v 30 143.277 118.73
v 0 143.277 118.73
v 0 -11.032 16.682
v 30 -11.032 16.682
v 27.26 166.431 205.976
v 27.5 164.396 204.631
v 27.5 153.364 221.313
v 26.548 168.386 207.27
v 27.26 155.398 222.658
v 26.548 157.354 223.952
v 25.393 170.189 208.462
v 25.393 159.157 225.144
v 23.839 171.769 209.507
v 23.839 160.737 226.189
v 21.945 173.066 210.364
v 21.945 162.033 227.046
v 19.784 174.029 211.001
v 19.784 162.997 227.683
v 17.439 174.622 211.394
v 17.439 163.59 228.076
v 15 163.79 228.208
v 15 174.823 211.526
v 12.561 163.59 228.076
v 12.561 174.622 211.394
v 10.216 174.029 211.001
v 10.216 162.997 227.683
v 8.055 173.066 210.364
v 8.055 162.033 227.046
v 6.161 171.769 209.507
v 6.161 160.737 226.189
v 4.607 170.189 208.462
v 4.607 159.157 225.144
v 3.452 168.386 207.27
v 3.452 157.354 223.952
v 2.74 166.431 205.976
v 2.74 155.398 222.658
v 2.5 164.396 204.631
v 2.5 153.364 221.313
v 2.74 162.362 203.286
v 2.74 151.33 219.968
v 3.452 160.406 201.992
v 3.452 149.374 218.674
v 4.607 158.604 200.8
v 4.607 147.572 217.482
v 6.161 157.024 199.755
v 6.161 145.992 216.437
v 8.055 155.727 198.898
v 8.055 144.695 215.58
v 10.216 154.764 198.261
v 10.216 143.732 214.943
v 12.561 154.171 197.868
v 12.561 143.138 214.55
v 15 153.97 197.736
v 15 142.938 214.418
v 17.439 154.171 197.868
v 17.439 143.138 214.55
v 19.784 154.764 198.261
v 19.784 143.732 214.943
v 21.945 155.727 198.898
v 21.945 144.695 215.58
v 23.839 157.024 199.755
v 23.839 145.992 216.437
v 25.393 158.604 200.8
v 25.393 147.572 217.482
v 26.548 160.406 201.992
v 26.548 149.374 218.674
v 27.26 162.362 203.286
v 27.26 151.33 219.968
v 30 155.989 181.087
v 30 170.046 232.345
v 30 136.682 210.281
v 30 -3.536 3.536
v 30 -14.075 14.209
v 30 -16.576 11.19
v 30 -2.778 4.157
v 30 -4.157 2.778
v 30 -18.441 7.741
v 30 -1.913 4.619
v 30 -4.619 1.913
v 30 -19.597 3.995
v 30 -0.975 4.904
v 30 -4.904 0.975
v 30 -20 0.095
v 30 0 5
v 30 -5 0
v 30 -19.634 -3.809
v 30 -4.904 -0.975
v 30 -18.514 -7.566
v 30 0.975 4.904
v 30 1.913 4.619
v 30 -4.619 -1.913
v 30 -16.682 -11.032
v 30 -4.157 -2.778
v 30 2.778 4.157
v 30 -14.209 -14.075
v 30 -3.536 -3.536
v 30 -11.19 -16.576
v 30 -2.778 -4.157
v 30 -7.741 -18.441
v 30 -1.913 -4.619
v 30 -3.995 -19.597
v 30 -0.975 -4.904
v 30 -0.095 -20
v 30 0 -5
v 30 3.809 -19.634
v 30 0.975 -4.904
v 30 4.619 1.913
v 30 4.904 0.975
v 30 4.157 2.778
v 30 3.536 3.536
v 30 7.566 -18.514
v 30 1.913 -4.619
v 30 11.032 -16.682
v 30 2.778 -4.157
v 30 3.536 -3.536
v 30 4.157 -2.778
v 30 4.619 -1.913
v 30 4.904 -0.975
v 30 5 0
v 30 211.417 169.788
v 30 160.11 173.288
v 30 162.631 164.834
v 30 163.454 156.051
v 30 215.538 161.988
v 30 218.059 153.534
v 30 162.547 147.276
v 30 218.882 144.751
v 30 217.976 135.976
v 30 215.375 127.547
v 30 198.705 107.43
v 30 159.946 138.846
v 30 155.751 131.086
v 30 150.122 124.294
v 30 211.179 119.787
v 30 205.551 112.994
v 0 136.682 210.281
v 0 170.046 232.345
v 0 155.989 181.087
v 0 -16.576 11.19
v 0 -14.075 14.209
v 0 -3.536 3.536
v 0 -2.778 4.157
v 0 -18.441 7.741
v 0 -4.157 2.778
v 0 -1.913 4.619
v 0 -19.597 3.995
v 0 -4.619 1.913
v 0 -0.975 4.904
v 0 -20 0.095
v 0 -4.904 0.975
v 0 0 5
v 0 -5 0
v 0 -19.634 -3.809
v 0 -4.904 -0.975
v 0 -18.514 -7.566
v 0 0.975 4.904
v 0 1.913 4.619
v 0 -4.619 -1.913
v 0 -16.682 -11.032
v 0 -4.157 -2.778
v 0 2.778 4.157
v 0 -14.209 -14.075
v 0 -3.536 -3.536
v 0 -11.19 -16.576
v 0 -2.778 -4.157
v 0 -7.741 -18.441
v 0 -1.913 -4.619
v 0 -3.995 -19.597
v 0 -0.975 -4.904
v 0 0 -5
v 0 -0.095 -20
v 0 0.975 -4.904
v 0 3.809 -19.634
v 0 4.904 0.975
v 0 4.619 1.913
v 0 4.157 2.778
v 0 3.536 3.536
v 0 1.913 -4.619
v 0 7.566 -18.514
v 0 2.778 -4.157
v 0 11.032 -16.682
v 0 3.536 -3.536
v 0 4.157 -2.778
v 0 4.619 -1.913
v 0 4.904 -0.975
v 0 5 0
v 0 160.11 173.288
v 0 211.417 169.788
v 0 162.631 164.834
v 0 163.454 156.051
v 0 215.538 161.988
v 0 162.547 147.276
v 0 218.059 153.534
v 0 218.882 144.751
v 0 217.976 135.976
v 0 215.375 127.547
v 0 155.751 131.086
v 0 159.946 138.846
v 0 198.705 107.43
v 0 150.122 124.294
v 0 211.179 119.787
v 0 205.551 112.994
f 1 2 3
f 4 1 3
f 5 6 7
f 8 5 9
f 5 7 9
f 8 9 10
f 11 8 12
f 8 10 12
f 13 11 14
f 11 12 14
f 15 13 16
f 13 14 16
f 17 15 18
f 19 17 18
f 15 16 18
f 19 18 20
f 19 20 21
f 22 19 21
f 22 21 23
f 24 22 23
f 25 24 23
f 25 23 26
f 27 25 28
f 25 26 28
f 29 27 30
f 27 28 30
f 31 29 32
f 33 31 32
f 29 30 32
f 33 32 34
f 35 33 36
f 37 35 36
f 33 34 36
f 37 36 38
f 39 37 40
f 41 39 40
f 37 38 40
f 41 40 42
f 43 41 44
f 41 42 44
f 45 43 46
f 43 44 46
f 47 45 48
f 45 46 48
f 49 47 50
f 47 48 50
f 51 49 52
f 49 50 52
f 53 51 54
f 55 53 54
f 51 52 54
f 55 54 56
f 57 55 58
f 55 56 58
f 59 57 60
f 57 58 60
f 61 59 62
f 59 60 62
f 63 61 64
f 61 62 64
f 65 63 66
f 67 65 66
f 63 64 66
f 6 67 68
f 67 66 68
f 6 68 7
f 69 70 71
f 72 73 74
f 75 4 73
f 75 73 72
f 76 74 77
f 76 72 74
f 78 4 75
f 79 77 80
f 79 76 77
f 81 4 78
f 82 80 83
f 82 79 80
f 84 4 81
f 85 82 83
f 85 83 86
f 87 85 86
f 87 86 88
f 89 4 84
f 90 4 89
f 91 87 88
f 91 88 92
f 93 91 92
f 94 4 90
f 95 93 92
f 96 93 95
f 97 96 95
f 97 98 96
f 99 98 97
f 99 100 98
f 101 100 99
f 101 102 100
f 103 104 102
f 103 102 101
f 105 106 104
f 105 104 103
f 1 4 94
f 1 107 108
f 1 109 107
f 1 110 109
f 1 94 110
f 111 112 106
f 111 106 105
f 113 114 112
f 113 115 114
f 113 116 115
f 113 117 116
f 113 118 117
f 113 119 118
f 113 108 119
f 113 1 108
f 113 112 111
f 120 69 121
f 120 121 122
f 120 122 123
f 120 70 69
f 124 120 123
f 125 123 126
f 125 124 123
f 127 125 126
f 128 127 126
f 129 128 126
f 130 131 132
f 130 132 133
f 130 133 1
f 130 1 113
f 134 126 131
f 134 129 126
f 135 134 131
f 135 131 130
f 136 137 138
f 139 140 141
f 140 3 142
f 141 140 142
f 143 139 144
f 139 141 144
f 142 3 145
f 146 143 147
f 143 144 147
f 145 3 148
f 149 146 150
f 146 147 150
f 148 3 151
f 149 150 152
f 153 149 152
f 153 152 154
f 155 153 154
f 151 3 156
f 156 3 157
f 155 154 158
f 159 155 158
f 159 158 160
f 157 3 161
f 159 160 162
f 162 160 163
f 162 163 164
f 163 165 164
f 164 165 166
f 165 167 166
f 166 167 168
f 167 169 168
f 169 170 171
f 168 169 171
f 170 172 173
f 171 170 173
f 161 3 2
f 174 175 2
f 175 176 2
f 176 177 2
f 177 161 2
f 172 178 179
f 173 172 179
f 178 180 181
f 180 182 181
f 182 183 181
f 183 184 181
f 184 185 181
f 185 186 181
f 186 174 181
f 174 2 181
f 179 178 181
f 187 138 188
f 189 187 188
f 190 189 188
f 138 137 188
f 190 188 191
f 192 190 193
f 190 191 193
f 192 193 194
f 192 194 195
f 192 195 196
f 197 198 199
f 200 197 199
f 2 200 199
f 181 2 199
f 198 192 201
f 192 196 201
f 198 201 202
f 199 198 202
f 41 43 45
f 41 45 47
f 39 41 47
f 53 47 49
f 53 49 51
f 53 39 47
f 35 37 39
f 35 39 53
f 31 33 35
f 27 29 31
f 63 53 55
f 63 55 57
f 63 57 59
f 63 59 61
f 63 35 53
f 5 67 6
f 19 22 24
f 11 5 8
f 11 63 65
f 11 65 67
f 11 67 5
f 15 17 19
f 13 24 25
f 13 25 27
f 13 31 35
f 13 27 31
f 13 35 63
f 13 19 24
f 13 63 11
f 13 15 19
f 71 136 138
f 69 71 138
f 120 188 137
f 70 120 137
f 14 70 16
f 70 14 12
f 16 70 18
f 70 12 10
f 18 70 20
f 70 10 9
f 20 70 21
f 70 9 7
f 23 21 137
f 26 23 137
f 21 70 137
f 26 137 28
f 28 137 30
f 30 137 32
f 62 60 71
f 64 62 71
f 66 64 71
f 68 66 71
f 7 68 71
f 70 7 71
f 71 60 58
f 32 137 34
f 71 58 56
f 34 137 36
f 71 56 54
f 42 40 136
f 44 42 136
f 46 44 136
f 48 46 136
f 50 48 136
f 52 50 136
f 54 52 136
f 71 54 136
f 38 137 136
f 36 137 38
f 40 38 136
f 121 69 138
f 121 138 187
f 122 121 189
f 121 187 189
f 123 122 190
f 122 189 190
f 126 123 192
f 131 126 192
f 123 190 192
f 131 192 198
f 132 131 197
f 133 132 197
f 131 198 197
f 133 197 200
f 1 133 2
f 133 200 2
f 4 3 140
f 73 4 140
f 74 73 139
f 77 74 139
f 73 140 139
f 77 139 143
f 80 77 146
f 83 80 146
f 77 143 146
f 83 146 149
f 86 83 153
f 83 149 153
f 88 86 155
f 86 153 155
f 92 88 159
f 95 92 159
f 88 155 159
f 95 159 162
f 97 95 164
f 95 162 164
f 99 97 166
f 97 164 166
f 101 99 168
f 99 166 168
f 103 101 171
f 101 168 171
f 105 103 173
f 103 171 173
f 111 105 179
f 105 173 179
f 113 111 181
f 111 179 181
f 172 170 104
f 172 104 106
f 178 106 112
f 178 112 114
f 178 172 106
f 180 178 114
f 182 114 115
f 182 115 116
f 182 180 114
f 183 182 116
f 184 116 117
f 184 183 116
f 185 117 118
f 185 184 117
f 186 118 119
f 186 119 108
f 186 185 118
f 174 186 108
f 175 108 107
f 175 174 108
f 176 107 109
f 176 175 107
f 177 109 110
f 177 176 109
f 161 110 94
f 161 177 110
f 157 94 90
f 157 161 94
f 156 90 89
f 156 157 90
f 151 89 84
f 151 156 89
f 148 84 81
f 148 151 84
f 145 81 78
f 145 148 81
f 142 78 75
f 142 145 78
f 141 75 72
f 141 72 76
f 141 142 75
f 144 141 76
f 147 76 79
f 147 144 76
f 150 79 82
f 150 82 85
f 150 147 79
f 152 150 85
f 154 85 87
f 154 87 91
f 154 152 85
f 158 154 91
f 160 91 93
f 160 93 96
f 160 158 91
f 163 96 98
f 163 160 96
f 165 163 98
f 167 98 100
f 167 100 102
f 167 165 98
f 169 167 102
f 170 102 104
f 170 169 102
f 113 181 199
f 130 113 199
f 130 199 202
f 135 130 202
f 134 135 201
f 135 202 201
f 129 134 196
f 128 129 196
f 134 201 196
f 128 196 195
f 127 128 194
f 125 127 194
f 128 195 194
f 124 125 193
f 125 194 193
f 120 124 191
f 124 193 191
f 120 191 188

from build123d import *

# Parameters (mm, degrees)
SKETCH1_R           = 5
BOSS_EXTRUDE1_DEPTH = 30
SKETCH2_R           = 12.5
CUT_EXTRUDE1_DEPTH  = 20


with BuildPart() as part:
    # Sketch1 → Boss-Extrude1 (new body)
    with BuildSketch(Plane(origin=(0, 0, 0), x_dir=(0, 0, -1), z_dir=(1, 0, 0))):
        with BuildLine():
            Line((16.682027044, 11.032224332), (-107.430496688, 198.705028576))
            ThreePointArc((-107.430496688, 198.705028576), (-135.976276464, 217.975627767), (-169.787562283, 211.417084679))
            Line((-169.787562283, 211.417084679), (-232.345163698, 170.046243435))
            Line((-232.345163698, 170.046243435), (-210.280715034, 136.682189347))
            Line((-210.280715034, 136.682189347), (-181.087167707, 155.988581927))
            ThreePointArc((-181.087167707, 155.988581927), (-147.275881888, 162.547125016), (-118.730102112, 143.276525825))
            Line((-118.730102112, 143.276525825), (-16.682027044, -11.032224332))
            ThreePointArc((-16.682027044, -11.032224332), (11.032224332, -16.682027044), (16.682027044, 11.032224332))
        make_face()
        Circle(SKETCH1_R, mode=Mode.SUBTRACT)
    extrude(amount=BOSS_EXTRUDE1_DEPTH)

    # Sketch2 → Cut-Extrude1 (cut)
    with BuildSketch(Plane(origin=(0, -55.161121659, 83.41013522), x_dir=(1, 0, 0), z_dir=(0, -0.551611217, 0.834101352))):
        with Locations((15, 250)):
            Circle(SKETCH2_R)
    extrude(amount=-CUT_EXTRUDE1_DEPTH, mode=Mode.SUBTRACT)


solid = part.part
